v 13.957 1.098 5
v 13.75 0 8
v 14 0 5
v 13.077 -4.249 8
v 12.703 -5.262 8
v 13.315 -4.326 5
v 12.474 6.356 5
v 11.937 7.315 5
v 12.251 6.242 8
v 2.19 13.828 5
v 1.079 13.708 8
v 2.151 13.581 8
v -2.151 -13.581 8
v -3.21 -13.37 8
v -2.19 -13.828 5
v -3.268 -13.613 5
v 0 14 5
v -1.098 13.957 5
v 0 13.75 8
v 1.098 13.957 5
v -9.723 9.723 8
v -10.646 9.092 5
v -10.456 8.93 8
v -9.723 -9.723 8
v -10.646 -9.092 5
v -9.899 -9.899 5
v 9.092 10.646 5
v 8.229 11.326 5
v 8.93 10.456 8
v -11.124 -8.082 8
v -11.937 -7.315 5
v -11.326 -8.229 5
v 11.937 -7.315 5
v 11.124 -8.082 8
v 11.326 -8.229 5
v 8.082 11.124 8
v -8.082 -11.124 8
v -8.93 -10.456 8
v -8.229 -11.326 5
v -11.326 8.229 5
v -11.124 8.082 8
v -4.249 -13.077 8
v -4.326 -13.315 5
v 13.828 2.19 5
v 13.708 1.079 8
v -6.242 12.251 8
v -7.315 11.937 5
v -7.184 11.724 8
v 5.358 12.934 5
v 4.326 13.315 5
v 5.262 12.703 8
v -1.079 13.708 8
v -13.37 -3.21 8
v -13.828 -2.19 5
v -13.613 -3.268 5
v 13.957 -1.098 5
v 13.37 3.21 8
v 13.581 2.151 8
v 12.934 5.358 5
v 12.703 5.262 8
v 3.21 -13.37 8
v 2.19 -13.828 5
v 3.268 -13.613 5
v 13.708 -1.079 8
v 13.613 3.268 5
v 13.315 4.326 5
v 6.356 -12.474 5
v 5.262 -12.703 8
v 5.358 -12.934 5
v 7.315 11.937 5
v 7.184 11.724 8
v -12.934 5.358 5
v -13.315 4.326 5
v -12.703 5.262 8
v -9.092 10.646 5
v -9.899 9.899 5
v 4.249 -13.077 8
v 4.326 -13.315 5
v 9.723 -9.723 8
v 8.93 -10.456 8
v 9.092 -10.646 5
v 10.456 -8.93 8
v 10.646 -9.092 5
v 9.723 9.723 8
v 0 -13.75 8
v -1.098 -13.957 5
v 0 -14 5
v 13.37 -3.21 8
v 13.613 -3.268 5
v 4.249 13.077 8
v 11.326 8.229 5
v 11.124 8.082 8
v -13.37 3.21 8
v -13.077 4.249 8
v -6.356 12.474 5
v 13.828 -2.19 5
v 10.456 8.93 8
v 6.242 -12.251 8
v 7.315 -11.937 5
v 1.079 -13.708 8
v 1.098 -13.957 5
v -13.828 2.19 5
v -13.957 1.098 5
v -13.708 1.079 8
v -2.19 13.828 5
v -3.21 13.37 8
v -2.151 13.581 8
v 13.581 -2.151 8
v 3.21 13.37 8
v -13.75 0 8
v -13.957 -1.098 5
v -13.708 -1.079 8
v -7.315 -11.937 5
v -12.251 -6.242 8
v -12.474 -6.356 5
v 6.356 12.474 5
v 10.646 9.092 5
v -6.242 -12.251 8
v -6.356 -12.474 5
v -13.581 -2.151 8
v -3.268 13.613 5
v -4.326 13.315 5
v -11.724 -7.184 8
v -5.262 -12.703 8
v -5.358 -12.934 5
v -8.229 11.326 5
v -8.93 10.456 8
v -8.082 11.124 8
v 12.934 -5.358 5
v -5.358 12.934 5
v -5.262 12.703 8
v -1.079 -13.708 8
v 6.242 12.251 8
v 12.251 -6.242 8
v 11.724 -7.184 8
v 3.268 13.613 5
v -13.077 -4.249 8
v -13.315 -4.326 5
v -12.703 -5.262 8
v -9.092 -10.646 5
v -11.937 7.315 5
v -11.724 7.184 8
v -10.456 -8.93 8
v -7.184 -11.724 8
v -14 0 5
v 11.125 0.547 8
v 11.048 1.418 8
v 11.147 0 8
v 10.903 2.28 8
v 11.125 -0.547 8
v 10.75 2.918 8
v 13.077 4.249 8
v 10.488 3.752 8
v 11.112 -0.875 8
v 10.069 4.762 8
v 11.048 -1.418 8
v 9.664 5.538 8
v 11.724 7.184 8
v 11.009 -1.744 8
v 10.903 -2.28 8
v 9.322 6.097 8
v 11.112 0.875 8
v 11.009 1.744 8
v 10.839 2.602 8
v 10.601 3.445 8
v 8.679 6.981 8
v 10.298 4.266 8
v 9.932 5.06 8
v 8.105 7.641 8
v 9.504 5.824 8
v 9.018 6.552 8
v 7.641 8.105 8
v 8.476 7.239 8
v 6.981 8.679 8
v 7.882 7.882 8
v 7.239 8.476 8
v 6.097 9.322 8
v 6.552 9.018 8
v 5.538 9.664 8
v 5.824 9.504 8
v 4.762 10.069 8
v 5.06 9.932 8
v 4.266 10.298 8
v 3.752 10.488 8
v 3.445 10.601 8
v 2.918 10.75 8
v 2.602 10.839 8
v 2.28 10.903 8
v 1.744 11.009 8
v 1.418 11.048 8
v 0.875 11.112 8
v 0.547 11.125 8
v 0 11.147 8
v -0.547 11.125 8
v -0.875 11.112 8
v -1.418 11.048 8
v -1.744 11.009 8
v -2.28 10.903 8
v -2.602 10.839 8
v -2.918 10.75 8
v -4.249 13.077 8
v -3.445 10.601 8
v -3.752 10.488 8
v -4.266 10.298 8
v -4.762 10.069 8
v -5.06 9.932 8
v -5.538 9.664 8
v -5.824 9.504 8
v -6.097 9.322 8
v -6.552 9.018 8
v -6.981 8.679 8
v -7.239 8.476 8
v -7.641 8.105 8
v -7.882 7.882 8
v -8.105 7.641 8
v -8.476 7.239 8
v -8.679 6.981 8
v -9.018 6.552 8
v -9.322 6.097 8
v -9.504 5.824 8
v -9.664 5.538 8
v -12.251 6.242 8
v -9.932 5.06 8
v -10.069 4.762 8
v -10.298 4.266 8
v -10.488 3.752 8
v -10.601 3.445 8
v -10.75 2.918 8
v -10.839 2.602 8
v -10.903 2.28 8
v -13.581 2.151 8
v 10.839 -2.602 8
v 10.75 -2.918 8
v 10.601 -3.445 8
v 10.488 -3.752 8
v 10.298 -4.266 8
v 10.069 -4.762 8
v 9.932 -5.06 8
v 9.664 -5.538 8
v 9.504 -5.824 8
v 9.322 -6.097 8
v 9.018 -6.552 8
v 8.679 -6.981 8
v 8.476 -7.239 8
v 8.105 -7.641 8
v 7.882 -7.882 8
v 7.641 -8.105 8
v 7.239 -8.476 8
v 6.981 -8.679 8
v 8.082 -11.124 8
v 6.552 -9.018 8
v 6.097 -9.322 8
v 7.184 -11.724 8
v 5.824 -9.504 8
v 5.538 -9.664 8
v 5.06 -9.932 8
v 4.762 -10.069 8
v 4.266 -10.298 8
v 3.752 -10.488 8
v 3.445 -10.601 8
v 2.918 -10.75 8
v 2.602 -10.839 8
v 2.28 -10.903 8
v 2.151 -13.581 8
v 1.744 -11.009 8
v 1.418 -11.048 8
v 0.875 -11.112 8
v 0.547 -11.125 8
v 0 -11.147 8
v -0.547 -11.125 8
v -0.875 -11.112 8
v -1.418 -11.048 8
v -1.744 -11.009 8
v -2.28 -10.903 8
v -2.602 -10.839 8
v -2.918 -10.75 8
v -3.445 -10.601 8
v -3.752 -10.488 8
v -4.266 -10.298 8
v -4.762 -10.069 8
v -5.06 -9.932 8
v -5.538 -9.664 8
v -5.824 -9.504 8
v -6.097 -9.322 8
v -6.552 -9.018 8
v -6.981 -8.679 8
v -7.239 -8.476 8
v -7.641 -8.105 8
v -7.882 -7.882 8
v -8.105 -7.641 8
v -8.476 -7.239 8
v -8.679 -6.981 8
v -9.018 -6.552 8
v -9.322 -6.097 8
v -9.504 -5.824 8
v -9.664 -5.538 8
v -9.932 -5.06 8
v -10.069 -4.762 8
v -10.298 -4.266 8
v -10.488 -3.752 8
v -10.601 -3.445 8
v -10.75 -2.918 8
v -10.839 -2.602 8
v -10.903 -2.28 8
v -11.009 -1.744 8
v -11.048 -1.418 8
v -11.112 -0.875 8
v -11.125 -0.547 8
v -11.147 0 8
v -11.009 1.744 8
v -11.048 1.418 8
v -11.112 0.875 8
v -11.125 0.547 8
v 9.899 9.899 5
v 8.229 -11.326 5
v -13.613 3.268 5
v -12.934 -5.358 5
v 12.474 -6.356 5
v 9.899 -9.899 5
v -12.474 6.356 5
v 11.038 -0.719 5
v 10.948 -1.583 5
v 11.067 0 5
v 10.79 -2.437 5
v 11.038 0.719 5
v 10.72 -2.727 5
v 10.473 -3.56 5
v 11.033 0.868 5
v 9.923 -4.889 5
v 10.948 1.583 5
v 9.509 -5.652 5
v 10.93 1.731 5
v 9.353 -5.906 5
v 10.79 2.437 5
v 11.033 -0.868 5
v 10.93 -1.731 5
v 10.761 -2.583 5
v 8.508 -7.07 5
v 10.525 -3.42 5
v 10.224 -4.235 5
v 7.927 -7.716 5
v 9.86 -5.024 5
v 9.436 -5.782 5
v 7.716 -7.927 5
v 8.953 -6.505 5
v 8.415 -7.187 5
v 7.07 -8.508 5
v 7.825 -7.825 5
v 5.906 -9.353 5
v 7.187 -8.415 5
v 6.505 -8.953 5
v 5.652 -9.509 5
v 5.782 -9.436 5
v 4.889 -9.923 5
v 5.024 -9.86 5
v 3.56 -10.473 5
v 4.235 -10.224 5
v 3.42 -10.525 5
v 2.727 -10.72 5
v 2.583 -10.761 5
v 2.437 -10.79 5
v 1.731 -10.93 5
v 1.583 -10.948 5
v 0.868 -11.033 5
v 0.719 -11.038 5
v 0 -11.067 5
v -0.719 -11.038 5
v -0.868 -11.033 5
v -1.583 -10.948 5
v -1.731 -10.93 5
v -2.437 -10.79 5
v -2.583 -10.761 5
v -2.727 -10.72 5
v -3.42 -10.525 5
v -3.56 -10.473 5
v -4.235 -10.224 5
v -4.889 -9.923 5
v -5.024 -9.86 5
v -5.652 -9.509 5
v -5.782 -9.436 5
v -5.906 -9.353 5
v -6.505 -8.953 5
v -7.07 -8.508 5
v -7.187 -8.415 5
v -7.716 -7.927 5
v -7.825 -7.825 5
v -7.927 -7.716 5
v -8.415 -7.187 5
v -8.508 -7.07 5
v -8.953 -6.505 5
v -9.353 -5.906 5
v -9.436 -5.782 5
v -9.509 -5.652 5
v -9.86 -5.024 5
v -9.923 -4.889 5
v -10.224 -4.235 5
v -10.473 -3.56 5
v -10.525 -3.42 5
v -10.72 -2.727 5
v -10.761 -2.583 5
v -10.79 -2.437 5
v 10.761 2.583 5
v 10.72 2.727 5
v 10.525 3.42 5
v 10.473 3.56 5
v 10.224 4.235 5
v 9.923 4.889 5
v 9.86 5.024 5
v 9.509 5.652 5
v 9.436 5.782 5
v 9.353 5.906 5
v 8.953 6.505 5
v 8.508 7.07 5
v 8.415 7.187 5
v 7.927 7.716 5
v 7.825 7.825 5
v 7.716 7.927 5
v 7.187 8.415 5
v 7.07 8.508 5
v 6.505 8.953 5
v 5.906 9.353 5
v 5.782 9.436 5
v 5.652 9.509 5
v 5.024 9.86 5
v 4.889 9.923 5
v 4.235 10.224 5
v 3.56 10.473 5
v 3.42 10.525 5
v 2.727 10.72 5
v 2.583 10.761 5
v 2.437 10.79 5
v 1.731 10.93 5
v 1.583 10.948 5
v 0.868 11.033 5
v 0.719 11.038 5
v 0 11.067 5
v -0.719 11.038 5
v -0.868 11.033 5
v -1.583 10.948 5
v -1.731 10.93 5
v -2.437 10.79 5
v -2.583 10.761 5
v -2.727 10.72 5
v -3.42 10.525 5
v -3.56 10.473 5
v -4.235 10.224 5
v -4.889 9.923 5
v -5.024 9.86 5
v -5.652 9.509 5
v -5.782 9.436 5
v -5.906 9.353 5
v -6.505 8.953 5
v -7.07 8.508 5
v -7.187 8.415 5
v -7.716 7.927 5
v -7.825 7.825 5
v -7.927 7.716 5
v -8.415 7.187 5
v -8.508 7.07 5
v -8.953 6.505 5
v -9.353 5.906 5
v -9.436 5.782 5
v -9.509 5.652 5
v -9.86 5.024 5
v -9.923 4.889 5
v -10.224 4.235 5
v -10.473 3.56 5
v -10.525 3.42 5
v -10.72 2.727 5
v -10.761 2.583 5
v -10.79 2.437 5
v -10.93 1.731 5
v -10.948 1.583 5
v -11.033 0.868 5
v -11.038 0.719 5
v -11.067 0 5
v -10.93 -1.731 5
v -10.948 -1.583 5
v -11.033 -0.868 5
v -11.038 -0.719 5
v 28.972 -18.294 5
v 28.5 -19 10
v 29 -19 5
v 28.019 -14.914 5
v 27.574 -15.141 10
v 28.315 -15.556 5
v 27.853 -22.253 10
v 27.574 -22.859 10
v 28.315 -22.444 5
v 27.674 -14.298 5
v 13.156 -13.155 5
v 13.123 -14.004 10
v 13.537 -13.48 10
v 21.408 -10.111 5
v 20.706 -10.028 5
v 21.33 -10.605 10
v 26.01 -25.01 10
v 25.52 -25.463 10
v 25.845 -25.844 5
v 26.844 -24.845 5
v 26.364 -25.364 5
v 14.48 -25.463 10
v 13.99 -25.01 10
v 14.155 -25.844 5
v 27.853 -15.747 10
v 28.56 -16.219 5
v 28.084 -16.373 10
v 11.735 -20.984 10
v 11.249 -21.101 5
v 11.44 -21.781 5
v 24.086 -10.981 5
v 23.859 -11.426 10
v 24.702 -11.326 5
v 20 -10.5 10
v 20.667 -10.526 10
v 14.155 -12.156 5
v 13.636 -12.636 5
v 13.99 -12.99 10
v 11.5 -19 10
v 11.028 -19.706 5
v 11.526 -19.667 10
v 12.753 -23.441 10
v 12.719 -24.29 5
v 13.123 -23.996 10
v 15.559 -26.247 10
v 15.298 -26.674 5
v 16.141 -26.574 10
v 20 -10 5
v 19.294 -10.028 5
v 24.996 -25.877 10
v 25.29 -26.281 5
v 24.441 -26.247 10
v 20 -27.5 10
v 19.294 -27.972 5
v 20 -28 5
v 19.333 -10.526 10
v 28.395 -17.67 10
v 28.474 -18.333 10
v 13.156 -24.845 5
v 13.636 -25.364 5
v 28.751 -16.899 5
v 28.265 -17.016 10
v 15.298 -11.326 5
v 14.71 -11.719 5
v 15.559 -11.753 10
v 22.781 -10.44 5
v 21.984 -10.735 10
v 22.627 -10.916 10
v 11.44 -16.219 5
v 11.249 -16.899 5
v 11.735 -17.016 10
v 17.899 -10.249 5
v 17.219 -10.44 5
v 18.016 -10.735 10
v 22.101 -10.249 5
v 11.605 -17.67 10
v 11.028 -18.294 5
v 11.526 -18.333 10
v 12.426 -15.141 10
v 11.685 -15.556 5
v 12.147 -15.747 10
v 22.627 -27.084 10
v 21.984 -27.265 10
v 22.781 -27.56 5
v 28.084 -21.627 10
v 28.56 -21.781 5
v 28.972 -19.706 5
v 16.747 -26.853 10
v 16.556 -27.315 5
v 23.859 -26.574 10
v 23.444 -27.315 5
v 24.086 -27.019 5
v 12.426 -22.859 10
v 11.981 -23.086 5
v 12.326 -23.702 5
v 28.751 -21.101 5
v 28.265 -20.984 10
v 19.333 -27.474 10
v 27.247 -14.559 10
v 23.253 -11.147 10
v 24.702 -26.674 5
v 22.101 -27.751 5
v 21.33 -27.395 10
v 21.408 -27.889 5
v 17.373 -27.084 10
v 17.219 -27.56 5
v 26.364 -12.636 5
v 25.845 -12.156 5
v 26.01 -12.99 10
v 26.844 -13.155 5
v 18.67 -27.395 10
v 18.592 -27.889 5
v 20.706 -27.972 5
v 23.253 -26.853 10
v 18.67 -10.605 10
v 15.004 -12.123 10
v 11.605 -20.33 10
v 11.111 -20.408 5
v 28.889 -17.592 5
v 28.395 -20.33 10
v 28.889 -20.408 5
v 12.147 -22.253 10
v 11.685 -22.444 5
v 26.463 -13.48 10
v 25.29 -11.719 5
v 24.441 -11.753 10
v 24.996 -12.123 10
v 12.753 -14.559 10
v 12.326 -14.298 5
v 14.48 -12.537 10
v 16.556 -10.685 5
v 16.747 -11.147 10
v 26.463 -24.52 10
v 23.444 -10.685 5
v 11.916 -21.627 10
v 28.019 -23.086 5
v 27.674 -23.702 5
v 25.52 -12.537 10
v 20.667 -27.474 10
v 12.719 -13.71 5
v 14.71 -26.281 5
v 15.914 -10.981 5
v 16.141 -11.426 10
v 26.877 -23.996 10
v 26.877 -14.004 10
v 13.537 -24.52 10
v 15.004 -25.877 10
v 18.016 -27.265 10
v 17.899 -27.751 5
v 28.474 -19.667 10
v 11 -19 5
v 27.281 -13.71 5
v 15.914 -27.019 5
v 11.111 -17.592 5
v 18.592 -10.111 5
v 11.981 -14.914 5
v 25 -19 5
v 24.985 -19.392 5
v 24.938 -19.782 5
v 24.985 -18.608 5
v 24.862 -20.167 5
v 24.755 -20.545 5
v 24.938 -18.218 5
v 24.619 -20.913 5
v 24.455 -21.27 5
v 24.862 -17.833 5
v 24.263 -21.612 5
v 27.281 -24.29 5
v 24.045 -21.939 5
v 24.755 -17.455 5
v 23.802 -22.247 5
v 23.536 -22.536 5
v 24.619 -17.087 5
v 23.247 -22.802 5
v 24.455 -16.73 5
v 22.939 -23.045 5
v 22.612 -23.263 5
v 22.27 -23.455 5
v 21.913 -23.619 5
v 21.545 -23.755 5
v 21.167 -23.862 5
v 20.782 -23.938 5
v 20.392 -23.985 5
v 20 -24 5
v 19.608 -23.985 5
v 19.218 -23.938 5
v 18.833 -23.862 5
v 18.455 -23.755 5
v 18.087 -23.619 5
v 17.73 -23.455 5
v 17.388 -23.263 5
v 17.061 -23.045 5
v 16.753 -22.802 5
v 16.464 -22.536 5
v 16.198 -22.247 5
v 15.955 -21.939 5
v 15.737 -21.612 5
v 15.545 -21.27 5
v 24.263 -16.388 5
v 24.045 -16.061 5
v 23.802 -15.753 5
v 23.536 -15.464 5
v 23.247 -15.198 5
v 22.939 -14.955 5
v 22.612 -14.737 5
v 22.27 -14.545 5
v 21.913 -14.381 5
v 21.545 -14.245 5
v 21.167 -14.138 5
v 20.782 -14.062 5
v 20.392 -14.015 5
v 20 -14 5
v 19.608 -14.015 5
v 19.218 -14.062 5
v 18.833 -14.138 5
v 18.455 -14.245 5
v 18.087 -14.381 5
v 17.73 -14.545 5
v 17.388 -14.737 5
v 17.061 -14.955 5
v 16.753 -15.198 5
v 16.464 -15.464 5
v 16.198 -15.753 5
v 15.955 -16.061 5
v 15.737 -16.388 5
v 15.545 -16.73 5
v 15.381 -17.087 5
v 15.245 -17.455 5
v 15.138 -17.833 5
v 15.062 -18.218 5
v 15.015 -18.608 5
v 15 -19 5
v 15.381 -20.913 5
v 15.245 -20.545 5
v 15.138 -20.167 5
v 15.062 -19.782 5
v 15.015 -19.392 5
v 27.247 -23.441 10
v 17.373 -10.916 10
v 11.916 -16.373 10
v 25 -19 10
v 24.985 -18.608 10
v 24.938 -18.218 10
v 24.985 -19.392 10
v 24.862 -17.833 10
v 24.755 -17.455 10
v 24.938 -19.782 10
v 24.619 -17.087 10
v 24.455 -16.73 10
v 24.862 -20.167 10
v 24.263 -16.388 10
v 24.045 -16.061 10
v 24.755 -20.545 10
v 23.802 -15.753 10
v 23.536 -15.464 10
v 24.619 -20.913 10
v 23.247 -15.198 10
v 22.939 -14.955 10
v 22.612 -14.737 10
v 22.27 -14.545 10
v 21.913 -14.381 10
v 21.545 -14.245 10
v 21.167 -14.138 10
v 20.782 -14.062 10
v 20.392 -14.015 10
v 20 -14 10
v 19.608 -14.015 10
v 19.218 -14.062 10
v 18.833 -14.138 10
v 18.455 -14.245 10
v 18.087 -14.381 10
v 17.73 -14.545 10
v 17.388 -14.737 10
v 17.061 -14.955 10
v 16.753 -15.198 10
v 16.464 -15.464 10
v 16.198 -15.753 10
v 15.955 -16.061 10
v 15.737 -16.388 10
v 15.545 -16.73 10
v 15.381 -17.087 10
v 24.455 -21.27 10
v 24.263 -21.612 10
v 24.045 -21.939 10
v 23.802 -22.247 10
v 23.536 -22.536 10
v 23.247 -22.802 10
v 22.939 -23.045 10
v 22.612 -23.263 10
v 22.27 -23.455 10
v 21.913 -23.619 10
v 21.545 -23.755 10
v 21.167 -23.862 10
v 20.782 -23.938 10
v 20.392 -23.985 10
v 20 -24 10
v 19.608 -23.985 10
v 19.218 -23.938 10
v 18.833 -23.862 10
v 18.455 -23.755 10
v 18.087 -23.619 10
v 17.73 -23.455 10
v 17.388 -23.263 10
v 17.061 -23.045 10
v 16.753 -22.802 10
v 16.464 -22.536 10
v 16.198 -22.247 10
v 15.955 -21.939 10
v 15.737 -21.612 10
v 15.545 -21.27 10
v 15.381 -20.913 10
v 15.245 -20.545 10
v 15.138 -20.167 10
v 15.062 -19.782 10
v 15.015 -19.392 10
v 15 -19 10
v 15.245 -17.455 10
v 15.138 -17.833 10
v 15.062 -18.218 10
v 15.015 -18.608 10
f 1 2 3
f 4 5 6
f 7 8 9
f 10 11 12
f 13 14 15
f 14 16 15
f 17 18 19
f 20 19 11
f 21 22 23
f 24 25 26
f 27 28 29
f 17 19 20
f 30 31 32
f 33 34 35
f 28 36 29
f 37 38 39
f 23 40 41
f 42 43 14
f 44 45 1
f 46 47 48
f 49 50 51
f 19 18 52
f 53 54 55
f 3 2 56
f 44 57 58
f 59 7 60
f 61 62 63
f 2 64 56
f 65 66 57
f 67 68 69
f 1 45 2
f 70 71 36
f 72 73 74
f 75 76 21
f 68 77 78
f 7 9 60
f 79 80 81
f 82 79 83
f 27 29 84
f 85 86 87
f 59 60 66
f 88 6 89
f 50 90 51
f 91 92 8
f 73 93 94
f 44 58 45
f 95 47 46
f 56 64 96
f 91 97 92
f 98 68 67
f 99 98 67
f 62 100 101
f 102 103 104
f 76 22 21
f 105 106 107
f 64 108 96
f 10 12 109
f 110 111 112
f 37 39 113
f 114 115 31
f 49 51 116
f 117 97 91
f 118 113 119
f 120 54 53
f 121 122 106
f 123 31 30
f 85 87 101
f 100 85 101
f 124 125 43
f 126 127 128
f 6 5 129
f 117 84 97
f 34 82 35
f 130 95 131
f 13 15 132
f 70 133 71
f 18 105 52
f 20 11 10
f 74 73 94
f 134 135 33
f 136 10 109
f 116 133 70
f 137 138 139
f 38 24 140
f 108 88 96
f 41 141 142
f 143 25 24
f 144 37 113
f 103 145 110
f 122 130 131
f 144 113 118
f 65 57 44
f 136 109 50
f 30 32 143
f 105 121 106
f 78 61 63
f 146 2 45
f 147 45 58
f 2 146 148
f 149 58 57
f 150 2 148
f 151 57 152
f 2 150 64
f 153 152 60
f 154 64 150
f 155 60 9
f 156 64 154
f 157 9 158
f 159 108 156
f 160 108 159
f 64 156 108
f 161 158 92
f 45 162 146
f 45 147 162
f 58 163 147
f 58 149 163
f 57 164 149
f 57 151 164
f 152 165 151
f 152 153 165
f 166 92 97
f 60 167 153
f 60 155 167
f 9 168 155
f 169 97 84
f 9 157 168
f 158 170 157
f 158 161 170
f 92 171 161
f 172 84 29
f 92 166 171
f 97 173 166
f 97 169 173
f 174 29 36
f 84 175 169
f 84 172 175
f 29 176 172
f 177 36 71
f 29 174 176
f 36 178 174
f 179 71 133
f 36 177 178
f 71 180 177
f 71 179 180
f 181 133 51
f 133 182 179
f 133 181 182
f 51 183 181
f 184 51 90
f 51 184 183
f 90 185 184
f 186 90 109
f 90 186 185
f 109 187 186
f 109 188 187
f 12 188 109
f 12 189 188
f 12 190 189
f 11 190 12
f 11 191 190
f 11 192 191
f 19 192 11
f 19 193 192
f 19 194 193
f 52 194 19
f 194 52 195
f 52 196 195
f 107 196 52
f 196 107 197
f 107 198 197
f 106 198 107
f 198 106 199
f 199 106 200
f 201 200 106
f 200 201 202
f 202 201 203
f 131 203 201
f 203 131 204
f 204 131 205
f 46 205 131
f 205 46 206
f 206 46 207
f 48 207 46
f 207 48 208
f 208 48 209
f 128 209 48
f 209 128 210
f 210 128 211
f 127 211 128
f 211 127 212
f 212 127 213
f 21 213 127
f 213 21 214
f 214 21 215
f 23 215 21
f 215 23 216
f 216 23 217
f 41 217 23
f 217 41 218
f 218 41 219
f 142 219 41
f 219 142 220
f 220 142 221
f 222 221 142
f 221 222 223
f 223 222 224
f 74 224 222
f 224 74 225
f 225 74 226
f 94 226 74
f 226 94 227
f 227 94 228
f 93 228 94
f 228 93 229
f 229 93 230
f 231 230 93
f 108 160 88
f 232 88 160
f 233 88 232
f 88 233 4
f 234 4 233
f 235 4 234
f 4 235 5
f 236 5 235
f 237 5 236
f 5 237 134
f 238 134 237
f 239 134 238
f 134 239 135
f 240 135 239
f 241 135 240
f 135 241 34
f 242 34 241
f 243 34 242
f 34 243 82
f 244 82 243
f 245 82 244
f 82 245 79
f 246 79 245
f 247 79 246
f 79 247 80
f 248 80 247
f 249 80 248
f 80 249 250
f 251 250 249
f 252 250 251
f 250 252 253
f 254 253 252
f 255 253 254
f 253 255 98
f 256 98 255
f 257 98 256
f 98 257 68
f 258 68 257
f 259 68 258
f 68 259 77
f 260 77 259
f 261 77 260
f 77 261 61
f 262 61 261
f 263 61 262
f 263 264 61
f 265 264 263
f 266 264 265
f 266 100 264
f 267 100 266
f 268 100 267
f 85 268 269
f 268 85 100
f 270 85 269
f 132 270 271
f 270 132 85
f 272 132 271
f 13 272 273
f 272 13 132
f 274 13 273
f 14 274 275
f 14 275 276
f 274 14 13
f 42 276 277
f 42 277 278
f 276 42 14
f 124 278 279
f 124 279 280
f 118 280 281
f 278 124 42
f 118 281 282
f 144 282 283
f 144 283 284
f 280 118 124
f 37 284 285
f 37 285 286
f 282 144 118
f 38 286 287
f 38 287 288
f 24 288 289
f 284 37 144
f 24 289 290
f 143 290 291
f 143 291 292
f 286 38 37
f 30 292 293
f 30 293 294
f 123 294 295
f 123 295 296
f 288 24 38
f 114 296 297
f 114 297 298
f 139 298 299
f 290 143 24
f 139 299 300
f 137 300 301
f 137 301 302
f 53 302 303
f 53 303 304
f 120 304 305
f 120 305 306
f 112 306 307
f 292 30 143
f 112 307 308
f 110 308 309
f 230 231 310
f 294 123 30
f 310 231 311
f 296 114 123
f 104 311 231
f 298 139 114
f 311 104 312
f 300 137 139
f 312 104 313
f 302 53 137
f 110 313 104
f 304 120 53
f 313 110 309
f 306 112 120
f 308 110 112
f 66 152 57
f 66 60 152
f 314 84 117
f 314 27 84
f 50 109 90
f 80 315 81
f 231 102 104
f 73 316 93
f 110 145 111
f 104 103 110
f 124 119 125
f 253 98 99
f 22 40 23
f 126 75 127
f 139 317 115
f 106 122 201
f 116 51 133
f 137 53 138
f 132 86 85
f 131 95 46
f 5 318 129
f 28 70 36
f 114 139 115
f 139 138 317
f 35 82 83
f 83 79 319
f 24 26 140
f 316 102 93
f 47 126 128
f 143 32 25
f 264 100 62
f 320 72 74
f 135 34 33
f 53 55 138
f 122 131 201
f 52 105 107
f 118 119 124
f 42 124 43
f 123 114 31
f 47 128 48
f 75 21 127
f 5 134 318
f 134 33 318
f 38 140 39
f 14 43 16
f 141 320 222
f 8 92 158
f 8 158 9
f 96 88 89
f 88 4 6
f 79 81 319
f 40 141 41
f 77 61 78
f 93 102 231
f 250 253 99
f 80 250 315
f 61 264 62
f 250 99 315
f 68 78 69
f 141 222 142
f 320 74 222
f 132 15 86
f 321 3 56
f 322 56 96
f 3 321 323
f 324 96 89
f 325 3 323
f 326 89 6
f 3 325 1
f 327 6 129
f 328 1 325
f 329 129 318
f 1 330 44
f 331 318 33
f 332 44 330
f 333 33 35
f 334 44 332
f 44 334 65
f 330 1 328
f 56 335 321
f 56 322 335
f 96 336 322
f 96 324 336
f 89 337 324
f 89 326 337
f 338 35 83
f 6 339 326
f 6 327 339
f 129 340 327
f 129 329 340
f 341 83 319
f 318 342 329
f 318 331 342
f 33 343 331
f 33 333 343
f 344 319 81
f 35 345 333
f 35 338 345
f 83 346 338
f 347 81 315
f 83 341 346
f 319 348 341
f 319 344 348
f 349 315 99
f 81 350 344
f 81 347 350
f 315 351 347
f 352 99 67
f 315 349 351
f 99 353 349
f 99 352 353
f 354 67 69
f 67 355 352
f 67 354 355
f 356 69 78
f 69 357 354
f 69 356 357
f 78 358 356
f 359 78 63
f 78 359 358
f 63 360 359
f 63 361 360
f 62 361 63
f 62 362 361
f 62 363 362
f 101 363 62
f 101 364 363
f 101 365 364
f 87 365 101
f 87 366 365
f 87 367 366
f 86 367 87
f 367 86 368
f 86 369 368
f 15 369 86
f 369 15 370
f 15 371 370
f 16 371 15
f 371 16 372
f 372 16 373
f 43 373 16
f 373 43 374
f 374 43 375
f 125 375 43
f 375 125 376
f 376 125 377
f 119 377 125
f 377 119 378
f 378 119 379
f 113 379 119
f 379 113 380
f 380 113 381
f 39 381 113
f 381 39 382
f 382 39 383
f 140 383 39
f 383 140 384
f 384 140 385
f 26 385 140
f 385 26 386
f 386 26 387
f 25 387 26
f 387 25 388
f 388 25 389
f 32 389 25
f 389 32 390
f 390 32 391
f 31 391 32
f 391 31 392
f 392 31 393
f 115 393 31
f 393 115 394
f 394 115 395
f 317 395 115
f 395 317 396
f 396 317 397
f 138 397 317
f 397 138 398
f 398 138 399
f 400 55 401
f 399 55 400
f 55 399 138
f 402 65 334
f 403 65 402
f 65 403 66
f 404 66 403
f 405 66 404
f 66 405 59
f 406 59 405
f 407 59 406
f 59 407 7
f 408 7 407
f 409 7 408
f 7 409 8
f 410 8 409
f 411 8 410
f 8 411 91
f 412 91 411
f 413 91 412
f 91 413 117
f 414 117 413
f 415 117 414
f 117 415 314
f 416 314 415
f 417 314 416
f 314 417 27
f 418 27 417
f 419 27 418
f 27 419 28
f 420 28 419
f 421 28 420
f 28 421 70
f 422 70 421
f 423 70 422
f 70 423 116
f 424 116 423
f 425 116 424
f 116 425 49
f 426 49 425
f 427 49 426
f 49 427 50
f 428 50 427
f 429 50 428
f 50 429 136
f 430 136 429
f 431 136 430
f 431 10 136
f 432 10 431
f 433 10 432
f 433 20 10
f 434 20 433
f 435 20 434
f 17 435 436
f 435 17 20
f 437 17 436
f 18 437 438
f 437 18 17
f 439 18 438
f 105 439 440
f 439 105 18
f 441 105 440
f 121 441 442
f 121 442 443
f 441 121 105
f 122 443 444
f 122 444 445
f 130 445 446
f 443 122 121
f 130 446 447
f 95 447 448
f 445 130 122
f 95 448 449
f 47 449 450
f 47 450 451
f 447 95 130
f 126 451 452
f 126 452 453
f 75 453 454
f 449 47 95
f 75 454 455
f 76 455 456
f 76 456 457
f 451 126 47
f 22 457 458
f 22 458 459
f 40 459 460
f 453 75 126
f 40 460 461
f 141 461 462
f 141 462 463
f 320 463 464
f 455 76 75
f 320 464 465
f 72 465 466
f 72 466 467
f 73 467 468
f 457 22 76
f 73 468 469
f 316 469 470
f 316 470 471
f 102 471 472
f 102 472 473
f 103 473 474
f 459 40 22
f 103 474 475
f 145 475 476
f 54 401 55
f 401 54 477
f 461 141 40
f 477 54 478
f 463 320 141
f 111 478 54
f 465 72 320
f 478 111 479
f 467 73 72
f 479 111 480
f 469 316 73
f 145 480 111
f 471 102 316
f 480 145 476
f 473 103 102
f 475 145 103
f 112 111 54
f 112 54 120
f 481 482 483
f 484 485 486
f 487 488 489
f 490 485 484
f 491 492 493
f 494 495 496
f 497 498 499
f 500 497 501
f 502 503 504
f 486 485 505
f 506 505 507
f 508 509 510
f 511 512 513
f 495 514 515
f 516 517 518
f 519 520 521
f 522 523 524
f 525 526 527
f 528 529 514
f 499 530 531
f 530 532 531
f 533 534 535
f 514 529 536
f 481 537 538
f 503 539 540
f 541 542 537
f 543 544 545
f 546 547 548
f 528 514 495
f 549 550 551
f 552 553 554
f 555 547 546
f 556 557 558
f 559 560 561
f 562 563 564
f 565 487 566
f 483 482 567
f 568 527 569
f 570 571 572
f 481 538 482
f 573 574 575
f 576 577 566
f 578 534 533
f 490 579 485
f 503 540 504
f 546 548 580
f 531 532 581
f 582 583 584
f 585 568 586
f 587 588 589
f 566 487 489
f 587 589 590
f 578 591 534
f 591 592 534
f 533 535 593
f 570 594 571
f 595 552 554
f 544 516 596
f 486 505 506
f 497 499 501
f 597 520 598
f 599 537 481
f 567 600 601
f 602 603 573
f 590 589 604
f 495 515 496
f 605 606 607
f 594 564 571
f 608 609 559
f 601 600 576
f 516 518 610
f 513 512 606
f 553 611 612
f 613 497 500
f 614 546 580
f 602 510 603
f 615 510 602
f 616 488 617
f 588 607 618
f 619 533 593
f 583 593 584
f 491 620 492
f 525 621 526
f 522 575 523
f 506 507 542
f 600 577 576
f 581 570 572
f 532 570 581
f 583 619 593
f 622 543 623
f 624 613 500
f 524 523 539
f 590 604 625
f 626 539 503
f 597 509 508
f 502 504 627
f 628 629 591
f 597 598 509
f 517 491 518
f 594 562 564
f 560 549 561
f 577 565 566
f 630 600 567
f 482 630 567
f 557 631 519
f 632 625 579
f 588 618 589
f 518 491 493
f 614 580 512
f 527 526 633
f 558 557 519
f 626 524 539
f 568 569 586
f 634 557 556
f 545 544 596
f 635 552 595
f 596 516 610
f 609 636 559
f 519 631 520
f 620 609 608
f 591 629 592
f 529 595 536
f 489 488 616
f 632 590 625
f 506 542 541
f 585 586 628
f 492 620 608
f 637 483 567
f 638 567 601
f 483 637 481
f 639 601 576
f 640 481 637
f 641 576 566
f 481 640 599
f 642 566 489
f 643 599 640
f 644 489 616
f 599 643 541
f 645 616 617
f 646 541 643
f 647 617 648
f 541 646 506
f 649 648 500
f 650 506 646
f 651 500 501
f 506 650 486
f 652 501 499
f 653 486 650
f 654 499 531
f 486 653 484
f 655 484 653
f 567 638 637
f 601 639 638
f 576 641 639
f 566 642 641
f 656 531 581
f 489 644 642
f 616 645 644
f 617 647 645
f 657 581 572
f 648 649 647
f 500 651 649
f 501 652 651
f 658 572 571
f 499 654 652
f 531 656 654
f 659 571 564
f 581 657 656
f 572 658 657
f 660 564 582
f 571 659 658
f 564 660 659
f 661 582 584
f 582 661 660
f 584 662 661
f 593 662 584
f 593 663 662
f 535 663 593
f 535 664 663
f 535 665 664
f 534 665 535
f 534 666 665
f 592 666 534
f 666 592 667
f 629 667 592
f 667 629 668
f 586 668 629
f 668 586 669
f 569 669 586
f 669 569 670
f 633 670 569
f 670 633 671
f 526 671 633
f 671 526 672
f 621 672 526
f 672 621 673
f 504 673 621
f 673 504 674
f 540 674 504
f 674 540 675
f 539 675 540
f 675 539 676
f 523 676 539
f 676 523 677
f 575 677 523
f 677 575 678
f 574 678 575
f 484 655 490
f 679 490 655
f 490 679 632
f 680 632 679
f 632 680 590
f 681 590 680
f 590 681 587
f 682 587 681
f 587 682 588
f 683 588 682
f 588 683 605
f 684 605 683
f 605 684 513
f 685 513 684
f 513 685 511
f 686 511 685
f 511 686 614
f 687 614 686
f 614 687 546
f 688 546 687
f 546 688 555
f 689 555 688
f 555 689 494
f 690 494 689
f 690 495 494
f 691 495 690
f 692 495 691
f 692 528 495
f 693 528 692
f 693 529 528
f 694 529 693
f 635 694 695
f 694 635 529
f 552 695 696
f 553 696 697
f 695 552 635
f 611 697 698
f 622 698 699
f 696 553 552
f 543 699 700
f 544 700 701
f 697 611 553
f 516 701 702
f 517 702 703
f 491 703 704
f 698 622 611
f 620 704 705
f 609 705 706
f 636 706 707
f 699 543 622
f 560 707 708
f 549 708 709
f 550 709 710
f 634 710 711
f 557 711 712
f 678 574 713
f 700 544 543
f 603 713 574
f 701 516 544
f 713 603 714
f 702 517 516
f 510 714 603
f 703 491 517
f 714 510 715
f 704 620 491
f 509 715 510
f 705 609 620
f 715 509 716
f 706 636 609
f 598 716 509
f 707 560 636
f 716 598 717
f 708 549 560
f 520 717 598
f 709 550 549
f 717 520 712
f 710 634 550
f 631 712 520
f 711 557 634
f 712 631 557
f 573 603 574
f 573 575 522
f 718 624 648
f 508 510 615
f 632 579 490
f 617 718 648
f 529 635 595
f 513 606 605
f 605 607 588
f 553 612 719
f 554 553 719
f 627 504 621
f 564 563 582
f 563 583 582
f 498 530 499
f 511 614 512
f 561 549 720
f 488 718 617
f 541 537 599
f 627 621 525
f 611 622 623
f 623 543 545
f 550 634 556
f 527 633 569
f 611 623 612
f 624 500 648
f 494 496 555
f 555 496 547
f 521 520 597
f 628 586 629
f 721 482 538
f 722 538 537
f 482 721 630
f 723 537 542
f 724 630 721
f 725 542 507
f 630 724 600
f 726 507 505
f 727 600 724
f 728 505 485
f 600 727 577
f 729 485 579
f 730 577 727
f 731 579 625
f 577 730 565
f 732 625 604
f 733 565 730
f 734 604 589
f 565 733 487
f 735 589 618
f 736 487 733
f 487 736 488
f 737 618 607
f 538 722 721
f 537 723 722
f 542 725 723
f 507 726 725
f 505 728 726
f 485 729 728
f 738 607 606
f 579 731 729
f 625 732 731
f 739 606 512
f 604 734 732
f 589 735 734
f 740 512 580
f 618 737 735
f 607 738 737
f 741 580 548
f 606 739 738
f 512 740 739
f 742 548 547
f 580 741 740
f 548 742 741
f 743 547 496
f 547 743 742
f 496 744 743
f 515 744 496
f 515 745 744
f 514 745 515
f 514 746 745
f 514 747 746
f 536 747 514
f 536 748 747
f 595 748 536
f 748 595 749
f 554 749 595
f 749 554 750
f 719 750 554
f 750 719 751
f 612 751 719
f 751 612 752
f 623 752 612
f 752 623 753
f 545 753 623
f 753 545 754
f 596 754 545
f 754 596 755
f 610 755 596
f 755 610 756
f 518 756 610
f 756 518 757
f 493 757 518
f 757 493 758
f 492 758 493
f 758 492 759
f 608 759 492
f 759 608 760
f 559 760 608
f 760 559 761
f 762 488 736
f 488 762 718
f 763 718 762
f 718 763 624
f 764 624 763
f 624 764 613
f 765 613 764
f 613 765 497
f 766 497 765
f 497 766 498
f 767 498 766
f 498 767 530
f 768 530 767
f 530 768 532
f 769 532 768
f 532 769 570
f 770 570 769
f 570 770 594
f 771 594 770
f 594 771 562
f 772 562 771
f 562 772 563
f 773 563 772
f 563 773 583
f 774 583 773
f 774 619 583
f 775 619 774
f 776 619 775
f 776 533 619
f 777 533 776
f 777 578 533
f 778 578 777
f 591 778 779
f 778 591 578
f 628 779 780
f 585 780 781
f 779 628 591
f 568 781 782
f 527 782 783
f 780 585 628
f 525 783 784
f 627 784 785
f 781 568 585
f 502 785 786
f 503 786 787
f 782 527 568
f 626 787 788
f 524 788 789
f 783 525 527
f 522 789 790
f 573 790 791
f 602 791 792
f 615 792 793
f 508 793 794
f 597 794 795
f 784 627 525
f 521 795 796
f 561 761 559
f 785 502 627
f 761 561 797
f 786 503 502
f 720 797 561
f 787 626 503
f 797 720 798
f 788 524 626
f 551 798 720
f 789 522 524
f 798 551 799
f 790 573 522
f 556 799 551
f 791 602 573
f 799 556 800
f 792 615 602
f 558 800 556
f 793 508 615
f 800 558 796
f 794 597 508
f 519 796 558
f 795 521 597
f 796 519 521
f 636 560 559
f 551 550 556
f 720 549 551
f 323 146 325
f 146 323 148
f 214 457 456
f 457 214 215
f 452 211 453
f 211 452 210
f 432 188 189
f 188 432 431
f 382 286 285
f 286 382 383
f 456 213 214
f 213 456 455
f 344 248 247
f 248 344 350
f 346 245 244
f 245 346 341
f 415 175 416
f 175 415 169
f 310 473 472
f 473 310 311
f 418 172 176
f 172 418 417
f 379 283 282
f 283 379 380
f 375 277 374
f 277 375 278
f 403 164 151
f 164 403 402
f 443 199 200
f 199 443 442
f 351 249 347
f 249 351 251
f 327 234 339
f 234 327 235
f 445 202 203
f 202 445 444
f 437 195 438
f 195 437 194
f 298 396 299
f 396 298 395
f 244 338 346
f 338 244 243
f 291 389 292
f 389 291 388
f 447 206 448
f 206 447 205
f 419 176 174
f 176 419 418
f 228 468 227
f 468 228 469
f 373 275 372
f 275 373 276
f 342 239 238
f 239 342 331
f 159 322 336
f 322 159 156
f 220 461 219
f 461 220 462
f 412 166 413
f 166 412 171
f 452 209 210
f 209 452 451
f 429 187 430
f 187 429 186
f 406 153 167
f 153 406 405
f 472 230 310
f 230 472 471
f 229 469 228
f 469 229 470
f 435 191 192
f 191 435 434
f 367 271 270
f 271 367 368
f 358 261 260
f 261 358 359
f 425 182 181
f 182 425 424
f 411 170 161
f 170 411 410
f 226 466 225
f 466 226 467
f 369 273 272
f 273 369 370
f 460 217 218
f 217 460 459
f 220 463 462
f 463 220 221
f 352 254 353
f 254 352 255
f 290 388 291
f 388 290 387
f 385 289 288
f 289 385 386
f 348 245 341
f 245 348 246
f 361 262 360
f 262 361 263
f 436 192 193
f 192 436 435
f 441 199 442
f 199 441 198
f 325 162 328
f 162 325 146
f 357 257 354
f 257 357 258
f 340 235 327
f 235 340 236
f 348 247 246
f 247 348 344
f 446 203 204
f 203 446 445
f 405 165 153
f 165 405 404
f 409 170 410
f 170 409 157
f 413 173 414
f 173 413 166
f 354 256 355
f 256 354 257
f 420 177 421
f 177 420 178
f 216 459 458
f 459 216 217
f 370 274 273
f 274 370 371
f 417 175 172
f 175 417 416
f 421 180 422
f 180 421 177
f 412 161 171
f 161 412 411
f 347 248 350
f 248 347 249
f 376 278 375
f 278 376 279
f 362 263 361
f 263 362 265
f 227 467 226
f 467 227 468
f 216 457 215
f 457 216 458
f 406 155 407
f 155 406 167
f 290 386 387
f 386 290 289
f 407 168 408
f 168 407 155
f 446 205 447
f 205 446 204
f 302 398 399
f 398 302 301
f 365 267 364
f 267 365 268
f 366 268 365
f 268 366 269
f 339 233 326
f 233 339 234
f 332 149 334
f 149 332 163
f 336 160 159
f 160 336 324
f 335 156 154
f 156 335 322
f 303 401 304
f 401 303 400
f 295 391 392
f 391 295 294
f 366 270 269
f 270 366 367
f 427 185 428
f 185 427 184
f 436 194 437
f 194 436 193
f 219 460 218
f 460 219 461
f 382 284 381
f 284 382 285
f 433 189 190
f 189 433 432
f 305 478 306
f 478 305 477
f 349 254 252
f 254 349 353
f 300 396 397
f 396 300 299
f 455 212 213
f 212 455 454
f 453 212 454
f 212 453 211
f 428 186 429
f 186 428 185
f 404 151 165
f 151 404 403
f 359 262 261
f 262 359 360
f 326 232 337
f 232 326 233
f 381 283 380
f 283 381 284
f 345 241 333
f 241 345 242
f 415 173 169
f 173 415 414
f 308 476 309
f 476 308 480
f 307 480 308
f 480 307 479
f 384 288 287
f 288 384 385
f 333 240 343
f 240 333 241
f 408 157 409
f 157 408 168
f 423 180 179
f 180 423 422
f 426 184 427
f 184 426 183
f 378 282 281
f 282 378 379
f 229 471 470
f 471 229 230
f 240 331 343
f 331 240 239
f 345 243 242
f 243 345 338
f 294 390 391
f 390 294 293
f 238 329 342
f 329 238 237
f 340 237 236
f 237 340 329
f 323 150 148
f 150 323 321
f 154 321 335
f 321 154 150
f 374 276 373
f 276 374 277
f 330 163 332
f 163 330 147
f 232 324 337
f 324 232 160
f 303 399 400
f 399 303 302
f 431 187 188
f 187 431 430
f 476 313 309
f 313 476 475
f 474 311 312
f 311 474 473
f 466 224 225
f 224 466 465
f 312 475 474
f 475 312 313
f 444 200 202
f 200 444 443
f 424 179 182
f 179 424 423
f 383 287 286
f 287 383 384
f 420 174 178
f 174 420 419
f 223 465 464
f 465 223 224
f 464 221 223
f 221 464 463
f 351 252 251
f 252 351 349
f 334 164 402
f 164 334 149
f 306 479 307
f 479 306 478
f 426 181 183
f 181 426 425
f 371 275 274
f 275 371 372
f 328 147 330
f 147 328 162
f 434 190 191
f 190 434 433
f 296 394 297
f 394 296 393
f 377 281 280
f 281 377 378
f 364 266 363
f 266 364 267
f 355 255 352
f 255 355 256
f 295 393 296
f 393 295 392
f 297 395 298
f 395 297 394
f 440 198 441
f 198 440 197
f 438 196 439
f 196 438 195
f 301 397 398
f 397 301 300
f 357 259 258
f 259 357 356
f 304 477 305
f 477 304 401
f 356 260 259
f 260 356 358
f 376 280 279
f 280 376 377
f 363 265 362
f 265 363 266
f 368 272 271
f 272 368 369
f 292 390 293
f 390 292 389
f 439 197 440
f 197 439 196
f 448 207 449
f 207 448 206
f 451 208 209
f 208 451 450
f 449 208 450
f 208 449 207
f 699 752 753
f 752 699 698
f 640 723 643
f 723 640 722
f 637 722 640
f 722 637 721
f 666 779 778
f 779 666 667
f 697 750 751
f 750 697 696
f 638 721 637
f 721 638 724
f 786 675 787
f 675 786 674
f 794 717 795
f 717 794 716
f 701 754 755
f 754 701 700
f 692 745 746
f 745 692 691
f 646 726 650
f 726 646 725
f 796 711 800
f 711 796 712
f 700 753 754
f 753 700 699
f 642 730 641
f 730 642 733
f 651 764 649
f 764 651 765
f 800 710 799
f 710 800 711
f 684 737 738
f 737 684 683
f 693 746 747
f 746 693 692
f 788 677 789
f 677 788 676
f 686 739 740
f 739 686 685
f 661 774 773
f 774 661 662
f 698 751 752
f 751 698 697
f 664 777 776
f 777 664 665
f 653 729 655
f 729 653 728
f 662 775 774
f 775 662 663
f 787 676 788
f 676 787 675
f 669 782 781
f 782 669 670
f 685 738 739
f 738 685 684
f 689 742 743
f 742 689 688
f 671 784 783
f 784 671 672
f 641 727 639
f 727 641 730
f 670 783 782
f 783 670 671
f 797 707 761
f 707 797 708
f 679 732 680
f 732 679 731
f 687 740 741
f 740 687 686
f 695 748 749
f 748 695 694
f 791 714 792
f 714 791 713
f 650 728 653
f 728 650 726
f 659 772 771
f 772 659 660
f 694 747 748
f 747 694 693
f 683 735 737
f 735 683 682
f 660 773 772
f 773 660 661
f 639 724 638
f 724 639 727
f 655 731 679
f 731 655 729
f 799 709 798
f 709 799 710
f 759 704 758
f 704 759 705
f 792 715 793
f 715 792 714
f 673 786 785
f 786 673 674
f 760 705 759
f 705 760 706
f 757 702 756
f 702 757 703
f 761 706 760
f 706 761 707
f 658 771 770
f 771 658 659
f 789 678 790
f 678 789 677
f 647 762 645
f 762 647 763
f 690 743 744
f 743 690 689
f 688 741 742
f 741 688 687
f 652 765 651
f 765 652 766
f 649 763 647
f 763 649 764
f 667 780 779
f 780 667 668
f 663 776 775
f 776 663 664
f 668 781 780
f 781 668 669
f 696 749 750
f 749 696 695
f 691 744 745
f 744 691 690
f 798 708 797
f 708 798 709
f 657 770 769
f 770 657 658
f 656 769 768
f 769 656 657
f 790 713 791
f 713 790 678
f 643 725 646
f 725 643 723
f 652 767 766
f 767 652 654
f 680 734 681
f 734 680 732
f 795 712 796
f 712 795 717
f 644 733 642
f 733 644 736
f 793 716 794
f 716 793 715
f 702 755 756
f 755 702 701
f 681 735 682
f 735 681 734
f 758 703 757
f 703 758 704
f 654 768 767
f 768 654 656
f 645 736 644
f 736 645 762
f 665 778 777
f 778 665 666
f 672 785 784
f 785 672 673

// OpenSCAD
/* ====================================================================
 *
 *       Filename:  axeX_608-bearing_axe10_support.scad
 *
 *    Description:  608 bearing support
 *
 *                  external diameter : 22
 *                  in diameter       : 8 
 *                  length            : 7
 *
 *        Version:  1.0
 *        Created:  05 07 2016
 *       Revision:  none
 *       Compiler:  gcc
 *
 *         Author:  Sebastien Chassot (sinux), seba.ptl@sinux.net
 *
 * ====================================================================
 */


bearing_len = 7;
bearing_dia = 22;
shoulder_dia = 19.5;

depth_len = 5;

axeX_bearing_axe10();
module axeX_bearing_axe10() {

    /* Body */
    difference() {
        union() { 
            /* outside */
            linear_extrude(height=depth_len, center = false, $fn = 80)
                    import("../profiles/support_axe10_bearing-s0.dxf");
            translate([0, 0, depth_len])
                cylinder(d1 = 28, d2 = 27.5,  h = 3, $fn = 80);
            
            translate([20, -19, depth_len])
                cylinder(d1 = 18, d2 = 17, h = 5, $fn = 80);
        }             

        /* inside */
        cylinder(d = shoulder_dia, center = true, h = bearing_len*10, $fn = 80);

        translate([0, 0, 2.5])
            cylinder(d1 = bearing_dia, d2 = bearing_dia+0.8, h = 15, $fn = 80);
        
        translate([20, -19, 0])
            cylinder(d = 10, h = 50, center = true, $fn = 80);
        
    }
}
